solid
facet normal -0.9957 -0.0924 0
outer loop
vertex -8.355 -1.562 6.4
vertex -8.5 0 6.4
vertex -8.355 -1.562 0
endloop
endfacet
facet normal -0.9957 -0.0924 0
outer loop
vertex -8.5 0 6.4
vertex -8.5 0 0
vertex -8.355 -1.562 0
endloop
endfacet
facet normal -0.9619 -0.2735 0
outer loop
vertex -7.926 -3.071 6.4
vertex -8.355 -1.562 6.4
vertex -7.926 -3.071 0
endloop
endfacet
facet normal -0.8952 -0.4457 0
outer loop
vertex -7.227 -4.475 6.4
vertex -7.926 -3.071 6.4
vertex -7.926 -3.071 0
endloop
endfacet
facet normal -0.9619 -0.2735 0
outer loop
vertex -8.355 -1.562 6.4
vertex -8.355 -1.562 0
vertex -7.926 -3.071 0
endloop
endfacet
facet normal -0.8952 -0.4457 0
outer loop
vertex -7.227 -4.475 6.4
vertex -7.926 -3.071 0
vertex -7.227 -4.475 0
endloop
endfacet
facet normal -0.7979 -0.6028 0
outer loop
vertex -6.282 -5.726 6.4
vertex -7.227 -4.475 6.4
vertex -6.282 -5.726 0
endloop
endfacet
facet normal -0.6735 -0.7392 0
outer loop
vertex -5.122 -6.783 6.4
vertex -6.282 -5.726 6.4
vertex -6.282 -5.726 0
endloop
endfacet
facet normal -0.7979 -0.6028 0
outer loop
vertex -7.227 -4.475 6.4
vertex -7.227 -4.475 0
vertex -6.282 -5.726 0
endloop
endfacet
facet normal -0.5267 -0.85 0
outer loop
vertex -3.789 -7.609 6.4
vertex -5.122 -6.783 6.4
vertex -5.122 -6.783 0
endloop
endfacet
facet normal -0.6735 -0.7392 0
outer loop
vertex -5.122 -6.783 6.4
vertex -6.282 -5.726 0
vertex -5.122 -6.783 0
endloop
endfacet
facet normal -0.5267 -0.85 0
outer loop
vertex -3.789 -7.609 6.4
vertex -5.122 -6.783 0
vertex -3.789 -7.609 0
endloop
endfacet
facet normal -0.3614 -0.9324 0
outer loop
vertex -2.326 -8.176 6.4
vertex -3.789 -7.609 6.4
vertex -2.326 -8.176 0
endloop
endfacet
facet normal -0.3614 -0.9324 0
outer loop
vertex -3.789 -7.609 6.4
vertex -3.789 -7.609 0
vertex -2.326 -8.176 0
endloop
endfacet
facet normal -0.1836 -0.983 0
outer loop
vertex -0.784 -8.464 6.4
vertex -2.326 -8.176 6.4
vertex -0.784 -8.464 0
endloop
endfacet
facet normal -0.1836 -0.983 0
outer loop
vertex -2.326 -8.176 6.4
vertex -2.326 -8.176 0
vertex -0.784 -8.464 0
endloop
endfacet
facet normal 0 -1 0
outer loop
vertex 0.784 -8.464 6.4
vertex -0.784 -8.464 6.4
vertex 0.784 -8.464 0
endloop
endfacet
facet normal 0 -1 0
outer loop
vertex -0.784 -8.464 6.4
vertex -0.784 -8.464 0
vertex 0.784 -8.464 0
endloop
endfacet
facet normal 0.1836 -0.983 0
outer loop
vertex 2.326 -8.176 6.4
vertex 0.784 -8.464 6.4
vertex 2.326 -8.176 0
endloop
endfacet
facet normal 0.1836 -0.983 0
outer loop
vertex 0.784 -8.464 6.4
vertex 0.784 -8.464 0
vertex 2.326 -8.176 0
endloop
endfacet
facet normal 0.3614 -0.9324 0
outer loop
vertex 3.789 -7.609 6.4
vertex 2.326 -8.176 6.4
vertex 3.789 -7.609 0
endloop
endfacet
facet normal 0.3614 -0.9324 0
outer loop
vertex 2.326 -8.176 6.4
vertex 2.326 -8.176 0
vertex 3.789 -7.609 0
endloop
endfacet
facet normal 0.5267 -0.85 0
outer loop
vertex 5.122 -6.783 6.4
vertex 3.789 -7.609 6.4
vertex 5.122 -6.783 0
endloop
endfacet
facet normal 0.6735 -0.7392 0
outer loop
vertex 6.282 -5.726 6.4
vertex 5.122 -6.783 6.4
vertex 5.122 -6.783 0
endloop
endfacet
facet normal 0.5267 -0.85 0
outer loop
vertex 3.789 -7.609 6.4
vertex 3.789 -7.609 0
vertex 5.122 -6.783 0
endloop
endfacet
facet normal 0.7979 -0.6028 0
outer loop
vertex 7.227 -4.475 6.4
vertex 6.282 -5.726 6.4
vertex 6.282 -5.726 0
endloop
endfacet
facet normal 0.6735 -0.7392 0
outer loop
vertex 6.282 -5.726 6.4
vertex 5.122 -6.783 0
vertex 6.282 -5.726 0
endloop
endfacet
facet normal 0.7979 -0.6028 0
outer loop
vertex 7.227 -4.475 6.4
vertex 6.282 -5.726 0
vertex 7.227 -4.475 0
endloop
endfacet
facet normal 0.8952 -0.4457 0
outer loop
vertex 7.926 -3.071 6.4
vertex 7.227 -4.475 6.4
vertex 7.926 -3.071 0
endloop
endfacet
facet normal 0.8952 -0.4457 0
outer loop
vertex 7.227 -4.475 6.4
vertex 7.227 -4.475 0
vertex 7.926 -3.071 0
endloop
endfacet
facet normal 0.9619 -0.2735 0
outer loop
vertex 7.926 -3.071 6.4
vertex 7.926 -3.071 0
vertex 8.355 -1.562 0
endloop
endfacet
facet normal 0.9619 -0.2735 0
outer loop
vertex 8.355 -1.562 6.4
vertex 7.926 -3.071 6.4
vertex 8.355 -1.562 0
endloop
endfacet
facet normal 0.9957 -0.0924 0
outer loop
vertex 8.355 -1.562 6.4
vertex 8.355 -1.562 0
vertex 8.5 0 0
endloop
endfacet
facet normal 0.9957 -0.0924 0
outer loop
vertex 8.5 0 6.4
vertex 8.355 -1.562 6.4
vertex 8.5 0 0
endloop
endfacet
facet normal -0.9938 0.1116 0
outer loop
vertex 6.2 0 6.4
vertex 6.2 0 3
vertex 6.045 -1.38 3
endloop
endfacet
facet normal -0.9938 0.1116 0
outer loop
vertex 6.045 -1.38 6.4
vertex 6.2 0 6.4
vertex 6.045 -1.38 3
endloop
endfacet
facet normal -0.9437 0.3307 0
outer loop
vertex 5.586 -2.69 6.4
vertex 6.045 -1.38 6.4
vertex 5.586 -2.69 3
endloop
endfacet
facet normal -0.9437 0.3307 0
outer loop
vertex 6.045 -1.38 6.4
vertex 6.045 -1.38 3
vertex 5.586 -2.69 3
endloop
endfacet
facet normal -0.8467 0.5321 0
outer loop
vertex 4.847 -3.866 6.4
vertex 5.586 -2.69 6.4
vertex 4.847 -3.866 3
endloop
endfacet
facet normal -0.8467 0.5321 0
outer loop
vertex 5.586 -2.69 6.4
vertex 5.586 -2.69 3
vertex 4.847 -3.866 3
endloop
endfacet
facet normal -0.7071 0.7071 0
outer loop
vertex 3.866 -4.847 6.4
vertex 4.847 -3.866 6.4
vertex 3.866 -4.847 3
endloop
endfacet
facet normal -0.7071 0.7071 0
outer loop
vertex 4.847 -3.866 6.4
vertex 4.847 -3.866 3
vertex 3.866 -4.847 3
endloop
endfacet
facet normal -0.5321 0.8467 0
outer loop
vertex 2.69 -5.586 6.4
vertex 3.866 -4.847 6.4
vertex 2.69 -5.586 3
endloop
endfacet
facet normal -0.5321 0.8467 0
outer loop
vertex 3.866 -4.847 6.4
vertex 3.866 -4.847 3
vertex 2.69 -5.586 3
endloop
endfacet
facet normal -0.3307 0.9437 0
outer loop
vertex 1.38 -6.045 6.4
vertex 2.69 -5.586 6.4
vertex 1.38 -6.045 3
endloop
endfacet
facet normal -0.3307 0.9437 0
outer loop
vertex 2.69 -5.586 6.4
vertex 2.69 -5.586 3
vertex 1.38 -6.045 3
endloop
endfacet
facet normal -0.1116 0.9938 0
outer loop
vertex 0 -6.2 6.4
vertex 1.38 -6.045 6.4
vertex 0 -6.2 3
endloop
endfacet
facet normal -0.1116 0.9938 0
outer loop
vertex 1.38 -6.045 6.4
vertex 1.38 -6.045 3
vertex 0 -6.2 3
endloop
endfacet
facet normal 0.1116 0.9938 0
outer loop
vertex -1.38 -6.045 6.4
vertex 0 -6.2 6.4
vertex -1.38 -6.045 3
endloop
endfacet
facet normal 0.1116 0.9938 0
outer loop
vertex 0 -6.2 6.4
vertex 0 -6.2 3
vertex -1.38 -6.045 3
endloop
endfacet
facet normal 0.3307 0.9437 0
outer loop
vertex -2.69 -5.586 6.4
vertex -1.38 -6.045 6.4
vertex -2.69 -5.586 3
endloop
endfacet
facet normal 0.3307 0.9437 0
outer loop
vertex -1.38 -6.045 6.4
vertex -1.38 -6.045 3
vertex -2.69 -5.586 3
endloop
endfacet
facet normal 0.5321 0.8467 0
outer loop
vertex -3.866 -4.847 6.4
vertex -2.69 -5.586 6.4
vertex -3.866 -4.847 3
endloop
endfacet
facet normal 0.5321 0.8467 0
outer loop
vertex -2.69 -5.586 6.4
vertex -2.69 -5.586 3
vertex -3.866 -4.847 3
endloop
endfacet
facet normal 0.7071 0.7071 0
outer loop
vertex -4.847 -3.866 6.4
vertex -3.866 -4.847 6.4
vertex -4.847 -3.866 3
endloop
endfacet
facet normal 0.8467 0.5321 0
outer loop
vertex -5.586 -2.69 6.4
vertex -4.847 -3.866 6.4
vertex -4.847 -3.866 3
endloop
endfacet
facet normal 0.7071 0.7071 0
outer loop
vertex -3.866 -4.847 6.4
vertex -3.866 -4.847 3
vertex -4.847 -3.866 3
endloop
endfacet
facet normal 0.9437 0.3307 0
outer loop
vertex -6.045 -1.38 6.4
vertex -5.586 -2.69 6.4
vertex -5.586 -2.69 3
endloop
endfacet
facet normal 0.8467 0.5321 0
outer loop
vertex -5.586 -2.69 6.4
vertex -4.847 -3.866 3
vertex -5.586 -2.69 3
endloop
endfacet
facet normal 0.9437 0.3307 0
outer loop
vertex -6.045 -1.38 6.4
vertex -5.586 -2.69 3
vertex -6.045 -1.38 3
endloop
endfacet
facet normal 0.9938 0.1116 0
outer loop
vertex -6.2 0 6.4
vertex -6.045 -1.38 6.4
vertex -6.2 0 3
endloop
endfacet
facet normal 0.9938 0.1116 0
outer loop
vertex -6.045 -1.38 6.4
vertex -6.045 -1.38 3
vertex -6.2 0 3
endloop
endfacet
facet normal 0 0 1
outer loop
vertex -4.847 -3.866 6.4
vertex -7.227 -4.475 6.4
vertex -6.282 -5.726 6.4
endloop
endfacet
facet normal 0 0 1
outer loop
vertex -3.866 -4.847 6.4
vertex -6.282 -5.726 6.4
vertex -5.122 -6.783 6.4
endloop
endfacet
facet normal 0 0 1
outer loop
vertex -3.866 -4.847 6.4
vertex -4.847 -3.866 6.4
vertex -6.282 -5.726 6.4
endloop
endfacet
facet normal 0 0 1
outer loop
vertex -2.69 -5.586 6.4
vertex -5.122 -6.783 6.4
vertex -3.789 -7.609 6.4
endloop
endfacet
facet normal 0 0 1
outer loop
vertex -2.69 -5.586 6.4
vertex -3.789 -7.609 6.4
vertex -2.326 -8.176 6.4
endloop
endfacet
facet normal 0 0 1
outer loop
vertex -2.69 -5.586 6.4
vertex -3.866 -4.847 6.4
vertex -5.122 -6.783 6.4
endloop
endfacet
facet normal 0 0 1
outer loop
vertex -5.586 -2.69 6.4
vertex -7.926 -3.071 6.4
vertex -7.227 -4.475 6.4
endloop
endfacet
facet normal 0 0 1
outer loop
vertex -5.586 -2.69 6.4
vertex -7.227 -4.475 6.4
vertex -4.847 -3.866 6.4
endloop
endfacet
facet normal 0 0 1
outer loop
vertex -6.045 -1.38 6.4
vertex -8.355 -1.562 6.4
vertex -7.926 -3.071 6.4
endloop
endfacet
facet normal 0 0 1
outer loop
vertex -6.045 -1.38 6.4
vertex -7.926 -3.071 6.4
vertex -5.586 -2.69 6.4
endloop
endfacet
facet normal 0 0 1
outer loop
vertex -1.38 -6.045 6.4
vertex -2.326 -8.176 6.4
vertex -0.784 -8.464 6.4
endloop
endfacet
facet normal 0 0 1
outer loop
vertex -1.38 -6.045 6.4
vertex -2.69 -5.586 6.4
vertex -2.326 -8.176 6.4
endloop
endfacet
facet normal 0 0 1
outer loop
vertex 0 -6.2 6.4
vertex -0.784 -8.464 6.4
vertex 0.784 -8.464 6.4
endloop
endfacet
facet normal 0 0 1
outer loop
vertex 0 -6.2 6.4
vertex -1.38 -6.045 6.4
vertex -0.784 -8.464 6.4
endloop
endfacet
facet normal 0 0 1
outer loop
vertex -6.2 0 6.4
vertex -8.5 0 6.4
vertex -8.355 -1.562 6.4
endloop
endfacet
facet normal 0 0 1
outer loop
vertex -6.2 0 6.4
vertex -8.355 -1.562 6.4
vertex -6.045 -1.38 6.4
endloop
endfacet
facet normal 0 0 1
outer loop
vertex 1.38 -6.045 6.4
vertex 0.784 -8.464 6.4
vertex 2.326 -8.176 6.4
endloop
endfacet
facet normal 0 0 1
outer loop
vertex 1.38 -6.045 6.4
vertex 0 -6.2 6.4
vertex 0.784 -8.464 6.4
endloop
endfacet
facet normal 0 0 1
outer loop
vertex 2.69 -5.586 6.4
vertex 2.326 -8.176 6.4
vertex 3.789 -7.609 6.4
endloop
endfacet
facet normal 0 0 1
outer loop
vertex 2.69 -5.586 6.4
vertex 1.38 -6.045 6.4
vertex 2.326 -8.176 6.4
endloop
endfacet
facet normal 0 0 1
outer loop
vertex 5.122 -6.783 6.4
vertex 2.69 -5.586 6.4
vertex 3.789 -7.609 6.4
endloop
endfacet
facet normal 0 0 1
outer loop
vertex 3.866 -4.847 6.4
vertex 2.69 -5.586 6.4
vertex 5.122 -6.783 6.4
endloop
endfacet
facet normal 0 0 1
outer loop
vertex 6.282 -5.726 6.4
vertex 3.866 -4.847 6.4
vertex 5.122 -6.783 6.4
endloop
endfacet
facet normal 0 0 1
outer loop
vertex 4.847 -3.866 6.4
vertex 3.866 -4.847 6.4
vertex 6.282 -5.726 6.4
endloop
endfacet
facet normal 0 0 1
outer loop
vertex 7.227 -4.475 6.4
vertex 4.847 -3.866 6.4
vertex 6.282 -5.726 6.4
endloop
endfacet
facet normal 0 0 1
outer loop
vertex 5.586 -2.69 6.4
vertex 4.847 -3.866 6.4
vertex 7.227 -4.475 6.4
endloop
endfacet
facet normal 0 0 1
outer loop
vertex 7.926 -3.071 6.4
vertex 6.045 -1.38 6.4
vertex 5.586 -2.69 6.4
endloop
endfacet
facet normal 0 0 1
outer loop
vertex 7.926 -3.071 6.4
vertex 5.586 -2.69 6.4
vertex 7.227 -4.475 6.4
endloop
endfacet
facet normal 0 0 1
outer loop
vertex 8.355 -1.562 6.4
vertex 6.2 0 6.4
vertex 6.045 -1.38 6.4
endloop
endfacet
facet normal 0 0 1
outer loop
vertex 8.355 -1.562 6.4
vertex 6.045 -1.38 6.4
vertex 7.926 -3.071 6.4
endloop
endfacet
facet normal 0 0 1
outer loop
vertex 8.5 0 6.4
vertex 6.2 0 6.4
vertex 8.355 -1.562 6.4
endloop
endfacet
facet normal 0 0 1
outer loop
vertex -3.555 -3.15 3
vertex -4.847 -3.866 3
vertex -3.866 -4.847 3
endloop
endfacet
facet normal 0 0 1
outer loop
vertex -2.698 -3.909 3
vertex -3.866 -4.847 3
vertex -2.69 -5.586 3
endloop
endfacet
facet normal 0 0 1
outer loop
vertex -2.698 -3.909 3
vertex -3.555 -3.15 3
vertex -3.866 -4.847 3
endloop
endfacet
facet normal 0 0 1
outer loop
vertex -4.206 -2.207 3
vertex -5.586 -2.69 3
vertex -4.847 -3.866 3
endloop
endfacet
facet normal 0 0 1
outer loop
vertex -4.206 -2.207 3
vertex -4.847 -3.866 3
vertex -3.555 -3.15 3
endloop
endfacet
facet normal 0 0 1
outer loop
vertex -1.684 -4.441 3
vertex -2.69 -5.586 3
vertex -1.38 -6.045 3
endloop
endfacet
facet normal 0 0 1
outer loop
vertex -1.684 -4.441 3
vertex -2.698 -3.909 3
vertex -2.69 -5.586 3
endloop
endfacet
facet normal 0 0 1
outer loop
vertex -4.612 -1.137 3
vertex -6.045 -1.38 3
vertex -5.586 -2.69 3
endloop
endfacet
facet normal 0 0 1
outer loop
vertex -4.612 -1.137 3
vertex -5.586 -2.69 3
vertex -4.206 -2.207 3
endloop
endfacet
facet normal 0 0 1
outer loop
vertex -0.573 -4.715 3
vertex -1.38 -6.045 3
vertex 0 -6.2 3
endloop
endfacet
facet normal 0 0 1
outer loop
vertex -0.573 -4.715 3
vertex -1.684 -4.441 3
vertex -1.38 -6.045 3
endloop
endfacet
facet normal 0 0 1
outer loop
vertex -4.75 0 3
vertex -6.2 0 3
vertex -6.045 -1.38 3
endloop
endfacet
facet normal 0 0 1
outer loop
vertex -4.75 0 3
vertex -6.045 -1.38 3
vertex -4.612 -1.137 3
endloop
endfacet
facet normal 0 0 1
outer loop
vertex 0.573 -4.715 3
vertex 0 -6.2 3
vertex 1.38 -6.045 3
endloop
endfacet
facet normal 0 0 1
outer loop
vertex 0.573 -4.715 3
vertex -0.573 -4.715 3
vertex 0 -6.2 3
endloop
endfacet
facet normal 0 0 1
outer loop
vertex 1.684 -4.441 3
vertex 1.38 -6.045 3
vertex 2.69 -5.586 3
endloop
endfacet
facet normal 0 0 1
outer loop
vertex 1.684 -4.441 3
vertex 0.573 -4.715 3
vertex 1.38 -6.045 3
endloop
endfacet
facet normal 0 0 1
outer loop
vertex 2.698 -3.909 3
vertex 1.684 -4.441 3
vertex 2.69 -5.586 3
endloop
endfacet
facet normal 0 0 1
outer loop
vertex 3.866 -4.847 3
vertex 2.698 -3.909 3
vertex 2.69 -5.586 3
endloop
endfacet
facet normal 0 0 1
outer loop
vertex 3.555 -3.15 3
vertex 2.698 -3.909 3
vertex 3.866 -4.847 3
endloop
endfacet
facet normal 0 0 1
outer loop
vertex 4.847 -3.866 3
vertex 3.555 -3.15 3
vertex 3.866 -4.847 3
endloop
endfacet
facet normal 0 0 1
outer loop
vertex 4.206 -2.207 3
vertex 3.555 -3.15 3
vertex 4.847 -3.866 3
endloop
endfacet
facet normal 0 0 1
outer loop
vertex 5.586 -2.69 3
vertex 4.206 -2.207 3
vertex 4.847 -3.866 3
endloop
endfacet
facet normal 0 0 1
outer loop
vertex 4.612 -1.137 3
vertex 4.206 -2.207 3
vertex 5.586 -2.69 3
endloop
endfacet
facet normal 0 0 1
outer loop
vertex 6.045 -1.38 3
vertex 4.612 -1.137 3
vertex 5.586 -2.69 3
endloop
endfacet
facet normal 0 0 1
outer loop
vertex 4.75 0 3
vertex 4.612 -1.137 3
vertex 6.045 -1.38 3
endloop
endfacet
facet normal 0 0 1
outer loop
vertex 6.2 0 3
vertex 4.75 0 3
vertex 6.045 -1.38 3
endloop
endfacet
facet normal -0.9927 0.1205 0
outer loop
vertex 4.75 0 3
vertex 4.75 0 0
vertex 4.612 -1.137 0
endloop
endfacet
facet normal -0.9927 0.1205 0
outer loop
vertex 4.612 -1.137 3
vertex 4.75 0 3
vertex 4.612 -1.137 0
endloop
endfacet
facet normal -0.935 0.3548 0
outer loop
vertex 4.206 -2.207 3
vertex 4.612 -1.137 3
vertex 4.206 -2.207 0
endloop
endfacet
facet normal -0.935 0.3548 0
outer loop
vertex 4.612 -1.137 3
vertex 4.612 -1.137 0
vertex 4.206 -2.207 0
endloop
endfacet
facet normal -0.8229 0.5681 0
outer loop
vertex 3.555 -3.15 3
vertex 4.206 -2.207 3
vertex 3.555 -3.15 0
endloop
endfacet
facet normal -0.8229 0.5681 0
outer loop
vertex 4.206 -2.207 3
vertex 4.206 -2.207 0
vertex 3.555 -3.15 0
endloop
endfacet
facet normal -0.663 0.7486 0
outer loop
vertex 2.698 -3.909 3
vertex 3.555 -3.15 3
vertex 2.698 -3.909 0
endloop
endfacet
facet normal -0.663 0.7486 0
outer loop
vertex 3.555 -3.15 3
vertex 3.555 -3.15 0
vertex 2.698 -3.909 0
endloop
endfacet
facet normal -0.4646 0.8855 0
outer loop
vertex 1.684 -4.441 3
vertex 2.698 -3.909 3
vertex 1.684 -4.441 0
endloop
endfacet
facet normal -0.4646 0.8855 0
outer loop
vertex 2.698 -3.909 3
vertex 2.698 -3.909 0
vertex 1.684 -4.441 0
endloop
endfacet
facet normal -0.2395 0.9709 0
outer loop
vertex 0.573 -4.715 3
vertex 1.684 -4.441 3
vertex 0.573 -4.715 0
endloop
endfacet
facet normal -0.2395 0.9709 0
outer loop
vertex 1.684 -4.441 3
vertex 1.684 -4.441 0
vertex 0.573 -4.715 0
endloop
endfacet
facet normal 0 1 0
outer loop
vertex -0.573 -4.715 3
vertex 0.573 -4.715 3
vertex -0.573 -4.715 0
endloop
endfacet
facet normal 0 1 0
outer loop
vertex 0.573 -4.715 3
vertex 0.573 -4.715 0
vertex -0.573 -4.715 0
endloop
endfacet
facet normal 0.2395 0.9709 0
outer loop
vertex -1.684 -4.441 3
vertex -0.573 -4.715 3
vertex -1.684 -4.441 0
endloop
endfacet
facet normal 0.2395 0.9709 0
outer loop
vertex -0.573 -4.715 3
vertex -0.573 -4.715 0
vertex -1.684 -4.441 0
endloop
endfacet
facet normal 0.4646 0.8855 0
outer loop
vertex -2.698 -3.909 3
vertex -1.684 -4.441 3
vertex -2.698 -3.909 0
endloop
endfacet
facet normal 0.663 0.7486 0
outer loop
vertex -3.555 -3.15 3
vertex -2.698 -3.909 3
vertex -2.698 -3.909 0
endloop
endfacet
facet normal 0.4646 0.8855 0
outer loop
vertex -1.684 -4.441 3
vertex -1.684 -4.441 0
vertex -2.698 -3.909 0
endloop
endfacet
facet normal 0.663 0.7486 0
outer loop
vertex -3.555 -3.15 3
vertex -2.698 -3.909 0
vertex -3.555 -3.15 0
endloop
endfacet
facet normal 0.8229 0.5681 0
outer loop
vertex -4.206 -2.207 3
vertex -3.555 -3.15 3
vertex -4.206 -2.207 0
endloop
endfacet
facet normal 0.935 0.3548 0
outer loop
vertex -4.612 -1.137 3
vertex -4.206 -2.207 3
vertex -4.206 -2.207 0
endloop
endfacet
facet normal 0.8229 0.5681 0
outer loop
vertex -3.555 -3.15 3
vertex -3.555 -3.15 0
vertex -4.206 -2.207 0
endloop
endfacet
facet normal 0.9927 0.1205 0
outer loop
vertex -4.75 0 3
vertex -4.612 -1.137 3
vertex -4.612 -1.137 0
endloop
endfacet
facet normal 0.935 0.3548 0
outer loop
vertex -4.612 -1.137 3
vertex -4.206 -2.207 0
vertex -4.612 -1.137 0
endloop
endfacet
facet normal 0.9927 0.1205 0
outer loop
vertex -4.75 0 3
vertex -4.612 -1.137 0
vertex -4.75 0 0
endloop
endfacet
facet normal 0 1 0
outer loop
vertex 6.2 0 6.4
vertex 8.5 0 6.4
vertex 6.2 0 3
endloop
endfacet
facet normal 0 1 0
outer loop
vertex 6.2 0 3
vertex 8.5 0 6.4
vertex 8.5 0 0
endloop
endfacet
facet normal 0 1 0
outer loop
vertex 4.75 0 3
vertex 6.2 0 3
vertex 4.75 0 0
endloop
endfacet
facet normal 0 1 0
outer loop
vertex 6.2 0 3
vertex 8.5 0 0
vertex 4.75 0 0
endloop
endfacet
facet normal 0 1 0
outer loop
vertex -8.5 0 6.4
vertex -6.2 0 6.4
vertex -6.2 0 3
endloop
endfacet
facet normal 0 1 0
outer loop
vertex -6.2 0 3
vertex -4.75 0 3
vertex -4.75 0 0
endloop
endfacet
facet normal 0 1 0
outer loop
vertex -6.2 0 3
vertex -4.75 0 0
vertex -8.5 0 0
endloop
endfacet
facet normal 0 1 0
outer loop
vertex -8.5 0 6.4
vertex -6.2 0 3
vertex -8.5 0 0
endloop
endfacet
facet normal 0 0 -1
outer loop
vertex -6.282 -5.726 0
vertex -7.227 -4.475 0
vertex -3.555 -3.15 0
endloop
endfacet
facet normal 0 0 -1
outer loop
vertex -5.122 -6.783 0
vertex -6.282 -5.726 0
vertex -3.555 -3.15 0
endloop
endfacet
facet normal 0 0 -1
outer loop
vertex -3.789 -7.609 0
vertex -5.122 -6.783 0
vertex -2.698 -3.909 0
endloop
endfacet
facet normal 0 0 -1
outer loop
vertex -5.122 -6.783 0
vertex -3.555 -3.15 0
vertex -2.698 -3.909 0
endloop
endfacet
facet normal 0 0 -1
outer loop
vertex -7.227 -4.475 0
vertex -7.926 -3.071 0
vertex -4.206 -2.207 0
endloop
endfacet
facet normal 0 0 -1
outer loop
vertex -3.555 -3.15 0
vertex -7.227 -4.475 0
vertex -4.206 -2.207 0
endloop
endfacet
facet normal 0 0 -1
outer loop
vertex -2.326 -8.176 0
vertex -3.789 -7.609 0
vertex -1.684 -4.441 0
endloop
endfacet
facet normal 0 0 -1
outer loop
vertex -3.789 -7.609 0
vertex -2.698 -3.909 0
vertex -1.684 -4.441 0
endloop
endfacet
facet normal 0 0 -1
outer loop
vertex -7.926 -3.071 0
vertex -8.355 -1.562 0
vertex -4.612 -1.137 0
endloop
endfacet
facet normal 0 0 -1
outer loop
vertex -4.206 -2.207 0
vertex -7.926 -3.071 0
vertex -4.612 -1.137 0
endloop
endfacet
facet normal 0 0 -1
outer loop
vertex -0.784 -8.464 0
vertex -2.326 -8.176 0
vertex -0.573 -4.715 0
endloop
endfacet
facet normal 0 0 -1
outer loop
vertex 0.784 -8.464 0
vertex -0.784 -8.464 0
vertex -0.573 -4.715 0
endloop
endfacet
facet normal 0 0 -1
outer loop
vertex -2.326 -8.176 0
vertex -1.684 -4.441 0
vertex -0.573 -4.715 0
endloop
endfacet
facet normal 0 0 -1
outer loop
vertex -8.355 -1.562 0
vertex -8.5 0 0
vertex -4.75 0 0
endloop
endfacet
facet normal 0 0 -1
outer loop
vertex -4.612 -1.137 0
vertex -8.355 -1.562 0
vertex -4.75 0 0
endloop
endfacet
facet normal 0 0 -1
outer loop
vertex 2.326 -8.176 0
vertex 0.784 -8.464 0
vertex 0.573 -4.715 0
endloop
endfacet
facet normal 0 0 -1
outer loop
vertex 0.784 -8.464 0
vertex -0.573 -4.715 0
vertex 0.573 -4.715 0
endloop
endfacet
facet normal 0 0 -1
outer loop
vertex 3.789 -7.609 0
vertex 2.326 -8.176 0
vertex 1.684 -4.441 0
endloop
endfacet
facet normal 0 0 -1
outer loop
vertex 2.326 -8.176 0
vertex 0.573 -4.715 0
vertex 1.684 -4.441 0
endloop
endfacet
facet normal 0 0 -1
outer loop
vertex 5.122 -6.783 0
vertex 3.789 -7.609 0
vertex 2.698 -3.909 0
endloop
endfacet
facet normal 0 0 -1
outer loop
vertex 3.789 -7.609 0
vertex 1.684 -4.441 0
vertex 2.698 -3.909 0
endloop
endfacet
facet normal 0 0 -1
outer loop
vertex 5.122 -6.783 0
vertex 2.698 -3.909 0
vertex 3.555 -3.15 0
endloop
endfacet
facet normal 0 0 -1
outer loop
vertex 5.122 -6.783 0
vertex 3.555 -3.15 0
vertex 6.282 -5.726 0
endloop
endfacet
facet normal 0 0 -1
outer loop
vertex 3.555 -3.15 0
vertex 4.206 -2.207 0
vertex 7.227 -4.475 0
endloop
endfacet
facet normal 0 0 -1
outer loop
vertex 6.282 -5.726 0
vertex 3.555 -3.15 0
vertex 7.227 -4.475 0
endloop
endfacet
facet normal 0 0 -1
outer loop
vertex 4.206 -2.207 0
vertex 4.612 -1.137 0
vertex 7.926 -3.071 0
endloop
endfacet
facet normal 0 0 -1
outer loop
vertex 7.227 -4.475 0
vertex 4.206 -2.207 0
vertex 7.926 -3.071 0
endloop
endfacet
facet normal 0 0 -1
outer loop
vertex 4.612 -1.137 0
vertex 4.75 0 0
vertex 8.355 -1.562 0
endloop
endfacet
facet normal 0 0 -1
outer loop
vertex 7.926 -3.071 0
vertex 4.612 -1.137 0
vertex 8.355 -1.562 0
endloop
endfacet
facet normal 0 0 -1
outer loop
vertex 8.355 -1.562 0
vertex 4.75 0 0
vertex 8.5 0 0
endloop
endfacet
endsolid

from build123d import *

# Parameters (mm, degrees)
F1_DEPTH = 3
F3_DEPTH = 3.4


with BuildPart() as f1:
    # F0 (on Top) → F1 (new body)
    with BuildSketch(Plane.XY):
        with BuildLine():
            ThreePointArc((4.75, 0), (0, -4.75), (-4.75, 0))
            Line((-4.75, 0), (-8.5, 0))
            ThreePointArc((-8.5, 0), (0, -8.5), (8.5, 0))
            Line((8.5, 0), (4.75, 0))
        make_face()
    extrude(amount=F1_DEPTH)

    # F2 (on face) → F3 (join)
    with BuildSketch(Plane.XY.offset(3)):
        with BuildLine():
            Line((-6.2, 0), (-8.5, 0))
            ThreePointArc((-8.5, 0), (0, -8.5), (8.5, 0))
            Line((8.5, 0), (6.2, 0))
            ThreePointArc((6.2, 0), (0, -6.2), (-6.2, 0))
        make_face()
    extrude(amount=F3_DEPTH)


solid = f1.part
